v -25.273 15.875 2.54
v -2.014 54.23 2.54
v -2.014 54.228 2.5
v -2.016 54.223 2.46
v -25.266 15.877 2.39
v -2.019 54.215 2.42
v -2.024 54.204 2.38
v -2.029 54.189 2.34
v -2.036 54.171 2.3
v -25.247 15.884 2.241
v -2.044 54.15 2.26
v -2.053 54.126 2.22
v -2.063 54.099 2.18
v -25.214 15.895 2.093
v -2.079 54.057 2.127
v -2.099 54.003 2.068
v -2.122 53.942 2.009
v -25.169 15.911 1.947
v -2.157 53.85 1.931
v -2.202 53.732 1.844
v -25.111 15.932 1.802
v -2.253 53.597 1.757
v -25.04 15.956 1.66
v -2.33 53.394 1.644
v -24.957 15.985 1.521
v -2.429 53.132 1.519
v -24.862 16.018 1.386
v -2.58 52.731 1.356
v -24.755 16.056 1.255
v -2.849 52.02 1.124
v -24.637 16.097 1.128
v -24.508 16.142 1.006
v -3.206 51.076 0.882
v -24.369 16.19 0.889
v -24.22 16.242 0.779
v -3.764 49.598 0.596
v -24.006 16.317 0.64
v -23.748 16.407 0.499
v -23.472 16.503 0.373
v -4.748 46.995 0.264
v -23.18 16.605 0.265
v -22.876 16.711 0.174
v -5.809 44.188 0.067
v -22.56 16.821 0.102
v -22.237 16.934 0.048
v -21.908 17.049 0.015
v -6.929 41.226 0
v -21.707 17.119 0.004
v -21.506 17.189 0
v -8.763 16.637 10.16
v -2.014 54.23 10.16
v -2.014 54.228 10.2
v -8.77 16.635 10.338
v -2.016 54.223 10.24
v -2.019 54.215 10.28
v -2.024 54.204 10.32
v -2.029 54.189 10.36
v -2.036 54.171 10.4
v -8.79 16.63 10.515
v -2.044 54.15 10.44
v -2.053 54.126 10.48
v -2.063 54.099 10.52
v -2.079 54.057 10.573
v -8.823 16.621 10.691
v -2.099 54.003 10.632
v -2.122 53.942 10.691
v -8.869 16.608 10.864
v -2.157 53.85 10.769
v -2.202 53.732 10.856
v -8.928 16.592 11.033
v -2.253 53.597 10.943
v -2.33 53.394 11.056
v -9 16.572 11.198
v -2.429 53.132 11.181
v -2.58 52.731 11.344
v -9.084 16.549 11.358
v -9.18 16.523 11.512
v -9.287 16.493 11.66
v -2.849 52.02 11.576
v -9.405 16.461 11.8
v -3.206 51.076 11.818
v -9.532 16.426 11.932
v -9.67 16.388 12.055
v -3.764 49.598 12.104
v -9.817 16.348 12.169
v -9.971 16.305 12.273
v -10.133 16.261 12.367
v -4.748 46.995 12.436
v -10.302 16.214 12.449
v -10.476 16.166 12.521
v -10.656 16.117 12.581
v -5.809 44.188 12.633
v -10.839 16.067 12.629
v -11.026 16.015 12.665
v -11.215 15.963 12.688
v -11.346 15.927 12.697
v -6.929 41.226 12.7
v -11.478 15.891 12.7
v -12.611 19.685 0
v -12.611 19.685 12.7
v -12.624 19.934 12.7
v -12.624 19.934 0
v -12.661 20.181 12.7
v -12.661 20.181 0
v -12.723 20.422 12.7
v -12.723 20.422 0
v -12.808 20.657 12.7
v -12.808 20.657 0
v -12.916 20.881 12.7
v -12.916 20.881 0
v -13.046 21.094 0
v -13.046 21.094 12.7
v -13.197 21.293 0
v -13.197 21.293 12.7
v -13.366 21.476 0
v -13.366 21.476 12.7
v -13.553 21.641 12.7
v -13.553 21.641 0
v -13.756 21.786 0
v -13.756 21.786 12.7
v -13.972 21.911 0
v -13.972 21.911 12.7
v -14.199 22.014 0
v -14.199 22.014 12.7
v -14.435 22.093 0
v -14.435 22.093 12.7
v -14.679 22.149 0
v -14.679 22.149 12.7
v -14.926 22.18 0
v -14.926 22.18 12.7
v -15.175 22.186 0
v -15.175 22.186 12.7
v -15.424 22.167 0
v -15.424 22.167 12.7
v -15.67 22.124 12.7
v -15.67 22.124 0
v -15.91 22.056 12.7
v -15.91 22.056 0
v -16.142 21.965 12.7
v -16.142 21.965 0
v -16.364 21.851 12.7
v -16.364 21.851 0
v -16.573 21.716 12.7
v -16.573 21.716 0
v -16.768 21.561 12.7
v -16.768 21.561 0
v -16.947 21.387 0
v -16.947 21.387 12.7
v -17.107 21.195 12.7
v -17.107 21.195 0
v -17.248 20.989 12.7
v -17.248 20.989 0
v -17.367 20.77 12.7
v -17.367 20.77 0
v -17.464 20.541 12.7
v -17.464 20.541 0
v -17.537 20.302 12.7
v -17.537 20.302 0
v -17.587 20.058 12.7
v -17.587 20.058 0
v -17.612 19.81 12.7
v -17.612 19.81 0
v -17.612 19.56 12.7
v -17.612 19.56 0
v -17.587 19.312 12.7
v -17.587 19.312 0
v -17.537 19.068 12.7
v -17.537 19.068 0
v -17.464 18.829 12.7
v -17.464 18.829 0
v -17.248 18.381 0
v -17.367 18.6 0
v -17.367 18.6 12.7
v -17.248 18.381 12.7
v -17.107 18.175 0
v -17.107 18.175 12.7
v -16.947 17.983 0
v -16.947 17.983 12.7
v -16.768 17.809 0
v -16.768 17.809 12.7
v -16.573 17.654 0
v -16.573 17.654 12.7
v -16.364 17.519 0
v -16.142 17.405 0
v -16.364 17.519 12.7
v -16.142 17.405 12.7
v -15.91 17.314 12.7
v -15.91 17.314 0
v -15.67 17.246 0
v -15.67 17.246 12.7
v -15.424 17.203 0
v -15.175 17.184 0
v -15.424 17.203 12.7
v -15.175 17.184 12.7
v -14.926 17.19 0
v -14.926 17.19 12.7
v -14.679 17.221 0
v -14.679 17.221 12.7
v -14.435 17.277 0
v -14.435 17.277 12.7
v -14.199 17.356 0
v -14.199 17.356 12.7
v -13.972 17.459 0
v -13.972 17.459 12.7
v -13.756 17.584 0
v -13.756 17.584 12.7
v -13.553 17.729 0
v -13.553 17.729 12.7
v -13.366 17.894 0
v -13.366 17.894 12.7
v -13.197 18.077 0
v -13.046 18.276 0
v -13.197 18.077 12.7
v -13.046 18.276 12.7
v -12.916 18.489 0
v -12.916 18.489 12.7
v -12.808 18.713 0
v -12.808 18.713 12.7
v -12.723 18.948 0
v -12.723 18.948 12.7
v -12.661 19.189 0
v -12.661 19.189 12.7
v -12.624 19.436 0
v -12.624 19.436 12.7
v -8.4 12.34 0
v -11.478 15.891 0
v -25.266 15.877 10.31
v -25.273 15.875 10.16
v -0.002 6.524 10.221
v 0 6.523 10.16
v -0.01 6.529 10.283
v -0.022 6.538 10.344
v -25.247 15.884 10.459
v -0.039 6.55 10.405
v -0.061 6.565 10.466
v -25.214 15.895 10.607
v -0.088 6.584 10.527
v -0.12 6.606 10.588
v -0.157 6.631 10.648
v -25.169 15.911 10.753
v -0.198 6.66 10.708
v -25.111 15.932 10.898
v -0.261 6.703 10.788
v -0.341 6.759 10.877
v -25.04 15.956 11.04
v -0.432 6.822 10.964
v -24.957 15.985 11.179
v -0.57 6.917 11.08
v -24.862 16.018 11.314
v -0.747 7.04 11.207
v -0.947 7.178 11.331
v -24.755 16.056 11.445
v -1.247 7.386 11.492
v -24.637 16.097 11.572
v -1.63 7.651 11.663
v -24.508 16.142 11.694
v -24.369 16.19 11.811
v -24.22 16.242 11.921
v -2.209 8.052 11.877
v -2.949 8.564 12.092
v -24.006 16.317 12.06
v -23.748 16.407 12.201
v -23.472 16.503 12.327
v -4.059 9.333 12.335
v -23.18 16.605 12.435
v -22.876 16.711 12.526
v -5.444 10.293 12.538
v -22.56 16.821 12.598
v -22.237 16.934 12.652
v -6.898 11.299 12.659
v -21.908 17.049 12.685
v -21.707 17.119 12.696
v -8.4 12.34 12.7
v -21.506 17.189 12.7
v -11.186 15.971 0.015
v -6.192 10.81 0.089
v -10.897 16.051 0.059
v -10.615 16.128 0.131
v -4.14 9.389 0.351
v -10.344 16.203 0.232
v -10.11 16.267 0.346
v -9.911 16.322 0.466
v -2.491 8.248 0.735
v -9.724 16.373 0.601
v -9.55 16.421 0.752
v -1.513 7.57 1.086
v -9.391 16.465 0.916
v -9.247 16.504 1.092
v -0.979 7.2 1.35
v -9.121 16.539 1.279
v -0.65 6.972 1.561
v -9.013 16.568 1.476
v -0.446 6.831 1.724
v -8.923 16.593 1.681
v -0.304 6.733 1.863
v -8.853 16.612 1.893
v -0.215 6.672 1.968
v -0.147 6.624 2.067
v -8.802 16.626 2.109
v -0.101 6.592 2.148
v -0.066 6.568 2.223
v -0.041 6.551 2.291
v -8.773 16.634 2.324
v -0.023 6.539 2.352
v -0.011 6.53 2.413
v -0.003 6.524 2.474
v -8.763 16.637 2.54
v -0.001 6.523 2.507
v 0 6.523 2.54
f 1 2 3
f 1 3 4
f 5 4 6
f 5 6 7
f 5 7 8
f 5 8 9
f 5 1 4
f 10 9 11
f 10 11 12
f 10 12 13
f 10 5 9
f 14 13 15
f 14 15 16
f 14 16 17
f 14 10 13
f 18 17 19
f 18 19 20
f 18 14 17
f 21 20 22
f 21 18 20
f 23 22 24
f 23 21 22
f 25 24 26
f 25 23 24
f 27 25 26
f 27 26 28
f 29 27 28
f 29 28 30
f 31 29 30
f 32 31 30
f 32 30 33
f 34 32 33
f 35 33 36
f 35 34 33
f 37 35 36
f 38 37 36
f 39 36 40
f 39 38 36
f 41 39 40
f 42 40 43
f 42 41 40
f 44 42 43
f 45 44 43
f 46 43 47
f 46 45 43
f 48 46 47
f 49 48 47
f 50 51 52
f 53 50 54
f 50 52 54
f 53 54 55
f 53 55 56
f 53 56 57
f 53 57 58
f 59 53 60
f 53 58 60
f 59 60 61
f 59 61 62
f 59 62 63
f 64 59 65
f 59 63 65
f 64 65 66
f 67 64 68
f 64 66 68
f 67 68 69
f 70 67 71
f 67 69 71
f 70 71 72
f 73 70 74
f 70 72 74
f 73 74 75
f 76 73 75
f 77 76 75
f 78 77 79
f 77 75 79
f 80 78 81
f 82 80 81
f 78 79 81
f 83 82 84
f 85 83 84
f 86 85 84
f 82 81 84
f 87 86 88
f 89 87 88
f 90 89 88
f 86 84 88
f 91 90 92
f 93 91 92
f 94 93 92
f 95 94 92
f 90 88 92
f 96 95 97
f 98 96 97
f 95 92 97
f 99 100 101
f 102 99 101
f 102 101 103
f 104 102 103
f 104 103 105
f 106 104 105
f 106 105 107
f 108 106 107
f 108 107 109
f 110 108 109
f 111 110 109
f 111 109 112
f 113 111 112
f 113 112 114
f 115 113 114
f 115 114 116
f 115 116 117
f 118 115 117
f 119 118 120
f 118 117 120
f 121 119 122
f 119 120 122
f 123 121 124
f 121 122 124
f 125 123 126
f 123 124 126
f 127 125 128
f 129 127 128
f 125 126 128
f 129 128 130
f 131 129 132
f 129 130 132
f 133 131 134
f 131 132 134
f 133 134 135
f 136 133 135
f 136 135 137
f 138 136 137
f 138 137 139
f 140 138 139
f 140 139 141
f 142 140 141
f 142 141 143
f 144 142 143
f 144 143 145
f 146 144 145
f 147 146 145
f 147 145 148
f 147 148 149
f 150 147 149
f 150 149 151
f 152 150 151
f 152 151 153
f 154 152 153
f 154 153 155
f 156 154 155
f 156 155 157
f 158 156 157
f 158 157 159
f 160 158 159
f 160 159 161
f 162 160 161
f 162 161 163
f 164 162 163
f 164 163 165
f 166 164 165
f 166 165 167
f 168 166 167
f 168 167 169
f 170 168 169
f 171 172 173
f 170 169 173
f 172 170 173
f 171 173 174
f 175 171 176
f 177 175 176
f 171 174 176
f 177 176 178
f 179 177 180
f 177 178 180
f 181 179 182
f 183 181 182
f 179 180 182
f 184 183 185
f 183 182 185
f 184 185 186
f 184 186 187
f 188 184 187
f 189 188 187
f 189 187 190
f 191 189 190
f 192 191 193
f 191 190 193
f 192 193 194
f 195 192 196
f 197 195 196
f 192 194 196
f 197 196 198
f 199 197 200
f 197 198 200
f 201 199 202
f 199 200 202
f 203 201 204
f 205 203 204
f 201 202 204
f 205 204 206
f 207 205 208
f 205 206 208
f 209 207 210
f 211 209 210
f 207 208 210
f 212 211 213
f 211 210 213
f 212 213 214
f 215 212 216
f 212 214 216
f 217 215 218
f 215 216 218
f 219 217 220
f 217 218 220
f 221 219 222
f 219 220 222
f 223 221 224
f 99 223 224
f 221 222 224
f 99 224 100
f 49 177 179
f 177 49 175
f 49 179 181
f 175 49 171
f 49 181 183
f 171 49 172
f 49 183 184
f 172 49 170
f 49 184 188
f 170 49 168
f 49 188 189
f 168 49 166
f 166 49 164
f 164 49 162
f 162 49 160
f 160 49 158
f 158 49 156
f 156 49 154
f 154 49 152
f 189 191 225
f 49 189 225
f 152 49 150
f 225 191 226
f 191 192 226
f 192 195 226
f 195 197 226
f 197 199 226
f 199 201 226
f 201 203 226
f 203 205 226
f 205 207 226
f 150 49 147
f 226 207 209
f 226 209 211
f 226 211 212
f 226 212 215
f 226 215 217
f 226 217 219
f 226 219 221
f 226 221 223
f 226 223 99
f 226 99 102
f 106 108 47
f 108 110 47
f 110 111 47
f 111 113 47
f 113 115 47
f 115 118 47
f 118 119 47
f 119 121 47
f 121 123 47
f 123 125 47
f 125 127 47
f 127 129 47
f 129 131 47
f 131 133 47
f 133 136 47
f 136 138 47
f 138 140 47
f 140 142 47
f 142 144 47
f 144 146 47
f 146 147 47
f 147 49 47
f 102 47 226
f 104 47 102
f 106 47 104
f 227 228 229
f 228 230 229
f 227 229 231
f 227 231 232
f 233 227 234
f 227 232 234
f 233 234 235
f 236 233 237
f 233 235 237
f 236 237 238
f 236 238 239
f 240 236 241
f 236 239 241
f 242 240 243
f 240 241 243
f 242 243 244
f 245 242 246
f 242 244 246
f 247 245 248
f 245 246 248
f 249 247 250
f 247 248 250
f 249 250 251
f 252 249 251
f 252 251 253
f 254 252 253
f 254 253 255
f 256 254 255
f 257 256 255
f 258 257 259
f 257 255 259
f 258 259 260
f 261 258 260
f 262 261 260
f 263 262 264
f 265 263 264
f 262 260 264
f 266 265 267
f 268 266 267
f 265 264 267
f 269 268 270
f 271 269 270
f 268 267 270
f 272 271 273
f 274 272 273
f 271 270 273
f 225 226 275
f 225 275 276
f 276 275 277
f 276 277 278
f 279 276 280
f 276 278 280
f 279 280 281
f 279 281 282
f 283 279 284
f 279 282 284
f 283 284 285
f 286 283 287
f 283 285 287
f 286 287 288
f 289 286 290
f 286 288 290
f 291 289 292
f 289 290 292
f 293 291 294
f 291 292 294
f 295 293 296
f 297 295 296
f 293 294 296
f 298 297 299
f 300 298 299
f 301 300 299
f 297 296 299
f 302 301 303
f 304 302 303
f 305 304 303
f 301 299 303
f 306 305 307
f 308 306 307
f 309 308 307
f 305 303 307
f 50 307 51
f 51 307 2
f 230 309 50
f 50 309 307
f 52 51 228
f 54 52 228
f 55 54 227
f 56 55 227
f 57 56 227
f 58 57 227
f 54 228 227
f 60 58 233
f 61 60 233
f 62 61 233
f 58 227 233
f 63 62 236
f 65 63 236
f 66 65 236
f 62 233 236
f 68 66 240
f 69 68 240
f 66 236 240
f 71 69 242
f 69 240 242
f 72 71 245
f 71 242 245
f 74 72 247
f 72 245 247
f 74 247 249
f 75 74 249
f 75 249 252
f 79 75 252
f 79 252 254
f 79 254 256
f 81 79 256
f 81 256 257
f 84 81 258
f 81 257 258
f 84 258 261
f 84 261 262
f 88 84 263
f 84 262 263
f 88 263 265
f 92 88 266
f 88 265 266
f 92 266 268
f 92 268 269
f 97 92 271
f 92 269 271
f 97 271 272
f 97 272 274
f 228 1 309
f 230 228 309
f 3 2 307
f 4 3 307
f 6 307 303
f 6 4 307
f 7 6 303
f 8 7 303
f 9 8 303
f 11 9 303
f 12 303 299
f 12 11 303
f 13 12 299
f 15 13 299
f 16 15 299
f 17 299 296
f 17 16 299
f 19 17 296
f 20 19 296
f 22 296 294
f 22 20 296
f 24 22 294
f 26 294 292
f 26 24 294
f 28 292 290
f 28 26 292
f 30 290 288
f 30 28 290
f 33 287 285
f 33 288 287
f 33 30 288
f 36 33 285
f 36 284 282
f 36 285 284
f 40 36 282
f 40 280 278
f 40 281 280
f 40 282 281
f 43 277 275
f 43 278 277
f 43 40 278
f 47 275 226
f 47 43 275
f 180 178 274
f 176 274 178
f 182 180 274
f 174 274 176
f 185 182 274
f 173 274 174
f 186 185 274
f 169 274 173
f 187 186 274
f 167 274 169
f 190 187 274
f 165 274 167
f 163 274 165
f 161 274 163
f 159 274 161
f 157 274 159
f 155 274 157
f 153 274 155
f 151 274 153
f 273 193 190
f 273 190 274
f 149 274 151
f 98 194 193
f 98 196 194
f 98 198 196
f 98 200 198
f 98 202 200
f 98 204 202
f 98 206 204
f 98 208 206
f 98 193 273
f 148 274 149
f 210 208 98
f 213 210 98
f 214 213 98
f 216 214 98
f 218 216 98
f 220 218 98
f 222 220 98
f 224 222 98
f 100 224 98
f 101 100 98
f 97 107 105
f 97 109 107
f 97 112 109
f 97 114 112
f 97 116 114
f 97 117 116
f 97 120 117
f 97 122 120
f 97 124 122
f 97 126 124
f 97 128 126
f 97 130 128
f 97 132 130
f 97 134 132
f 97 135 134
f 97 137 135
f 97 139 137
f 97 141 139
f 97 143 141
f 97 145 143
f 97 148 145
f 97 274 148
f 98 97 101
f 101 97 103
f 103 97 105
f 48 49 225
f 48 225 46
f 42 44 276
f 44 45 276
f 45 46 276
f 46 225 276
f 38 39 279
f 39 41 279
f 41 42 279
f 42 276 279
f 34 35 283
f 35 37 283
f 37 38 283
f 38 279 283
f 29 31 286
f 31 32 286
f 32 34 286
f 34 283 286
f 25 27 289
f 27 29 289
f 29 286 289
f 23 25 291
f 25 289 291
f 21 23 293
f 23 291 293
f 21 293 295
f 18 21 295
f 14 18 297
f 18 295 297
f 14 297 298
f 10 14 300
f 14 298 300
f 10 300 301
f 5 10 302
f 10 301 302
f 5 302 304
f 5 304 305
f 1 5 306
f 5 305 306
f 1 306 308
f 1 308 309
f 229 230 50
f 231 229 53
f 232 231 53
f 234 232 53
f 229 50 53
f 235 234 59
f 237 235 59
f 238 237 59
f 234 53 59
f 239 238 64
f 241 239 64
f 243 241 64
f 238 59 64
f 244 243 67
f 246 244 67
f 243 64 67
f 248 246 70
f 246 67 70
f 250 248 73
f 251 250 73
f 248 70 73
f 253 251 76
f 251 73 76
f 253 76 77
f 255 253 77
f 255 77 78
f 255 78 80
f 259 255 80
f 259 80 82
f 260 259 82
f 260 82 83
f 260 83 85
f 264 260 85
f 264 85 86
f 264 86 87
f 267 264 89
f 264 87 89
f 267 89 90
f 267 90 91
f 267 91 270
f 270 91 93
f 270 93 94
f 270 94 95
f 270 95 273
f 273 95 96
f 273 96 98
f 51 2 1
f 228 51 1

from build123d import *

# Parameters (mm, degrees)
F1_DEPTH = 12.7
F2_R     = 2.54
F3_R     = 2.54
F4_R     = 2.5016114836
F5_DEPTH = 12.954


with BuildPart() as f1:
    # F0 (on Top) → F1 (new body)
    with BuildSketch(Plane.XY):
        Polygon((-2.0137657411, 54.22963202), (-25.2730008215, 15.8750005066), (-8.7629994377, 16.6370011866), align=None)
        Polygon((-8.7629994377, 16.6370011866), (-25.2730008215, 15.8750005066), (0, 6.5225157887), align=None)
    extrude(amount=F1_DEPTH)

    # F2
    f2_edges = [f1.edges().sort_by_distance(p)[0] for p in [
        (-13.643383, 35.052316, 12.7),
        (-12.6365, 11.198758, 12.7),
        (-4.3815, 11.579758, 12.7),
        (-5.388383, 35.433317, 12.7),
    ]]
    fillet(f2_edges, radius=F2_R)

    # F3
    f3_edges = [f1.edges().sort_by_distance(p)[0] for p in [
        (-13.643383, 35.052316, 0),
        (-12.6365, 11.198758, 0),
        (-4.3815, 11.579758, 0),
        (-5.388383, 35.433317, 0),
    ]]
    fillet(f3_edges, radius=F3_R)

    # F4 (on face) → F5 (cut)
    with BuildSketch(Plane.XY.offset(12.7)):
        with Locations((-15.1129998267, 19.6850001812)):
            Circle(F4_R)
    extrude(amount=-F5_DEPTH, mode=Mode.SUBTRACT)


solid = f1.part
